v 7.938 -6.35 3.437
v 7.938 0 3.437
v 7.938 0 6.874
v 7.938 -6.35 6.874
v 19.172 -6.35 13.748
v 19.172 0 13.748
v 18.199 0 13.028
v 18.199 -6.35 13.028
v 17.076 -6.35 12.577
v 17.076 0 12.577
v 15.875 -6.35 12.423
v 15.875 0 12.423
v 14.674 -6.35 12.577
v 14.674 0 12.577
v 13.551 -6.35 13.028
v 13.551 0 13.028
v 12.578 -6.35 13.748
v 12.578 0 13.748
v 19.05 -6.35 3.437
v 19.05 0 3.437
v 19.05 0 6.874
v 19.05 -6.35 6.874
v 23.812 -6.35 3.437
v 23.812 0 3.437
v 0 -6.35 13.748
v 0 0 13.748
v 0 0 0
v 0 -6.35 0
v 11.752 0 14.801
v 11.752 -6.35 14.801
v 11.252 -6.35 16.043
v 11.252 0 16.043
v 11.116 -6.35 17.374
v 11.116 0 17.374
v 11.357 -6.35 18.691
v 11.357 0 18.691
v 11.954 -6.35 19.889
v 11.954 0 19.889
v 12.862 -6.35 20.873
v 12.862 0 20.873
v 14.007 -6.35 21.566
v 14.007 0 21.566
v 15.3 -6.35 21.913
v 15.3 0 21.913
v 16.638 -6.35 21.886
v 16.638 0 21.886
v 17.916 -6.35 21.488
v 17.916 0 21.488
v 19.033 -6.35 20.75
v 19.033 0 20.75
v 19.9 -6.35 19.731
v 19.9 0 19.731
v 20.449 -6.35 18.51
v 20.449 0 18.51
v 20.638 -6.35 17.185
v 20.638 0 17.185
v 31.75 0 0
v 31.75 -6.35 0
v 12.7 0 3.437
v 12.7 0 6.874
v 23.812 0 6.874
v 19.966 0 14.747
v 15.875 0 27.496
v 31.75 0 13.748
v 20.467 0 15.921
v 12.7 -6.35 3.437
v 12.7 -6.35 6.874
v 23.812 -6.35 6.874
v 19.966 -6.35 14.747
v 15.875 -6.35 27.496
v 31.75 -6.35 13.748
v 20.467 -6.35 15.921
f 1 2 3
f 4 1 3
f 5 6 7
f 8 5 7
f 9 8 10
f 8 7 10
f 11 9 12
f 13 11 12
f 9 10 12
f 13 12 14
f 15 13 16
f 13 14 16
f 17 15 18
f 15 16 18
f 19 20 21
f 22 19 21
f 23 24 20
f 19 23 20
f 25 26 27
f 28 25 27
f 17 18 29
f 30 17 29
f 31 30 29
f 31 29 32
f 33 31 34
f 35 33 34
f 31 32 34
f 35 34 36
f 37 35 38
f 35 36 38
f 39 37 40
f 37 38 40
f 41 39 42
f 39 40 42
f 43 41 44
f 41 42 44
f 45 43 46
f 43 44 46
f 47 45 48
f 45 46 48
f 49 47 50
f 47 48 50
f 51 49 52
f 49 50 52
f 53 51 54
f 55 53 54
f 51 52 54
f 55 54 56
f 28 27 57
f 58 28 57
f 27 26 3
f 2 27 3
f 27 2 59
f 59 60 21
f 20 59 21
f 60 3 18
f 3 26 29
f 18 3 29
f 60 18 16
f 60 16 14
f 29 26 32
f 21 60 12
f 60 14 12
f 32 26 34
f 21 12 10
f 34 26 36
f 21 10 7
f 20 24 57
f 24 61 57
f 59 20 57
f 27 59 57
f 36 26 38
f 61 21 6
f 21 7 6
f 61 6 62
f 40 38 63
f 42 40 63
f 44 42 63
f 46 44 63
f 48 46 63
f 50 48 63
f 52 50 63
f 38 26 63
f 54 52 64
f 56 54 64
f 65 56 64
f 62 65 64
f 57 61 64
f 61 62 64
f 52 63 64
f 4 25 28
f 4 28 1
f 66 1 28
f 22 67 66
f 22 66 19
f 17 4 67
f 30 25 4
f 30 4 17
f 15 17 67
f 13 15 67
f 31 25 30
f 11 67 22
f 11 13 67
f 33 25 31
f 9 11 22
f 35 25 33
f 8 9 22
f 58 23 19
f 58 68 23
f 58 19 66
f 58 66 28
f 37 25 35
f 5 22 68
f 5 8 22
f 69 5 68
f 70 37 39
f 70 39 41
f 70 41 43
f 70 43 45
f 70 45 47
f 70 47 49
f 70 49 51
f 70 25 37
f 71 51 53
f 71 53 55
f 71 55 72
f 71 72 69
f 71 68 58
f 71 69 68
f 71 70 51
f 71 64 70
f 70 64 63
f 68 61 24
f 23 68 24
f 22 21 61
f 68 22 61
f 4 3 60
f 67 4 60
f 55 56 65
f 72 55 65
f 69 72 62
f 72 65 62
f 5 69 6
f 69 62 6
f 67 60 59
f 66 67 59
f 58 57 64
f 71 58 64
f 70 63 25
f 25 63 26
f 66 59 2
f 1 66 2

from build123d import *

# Parameters (mm, degrees)
F1_DEPTH = 6.35


# Not quite as in the source:
# - a feature names something its author has since deleted; it is built from what else it names


with BuildPart() as f1:
    # F0 (on Front) → F1 (new body)
    with BuildSketch(Plane.XZ):
        Polygon((1.984375, 3.4370383213), (0, 0), (7.9375, 0), (15.875, 0), (31.75, 0), (29.765625, 3.4370383213), (23.8125, 3.4370383213), (19.05, 3.4370383213), (15.875, 3.4370383213), (12.7, 3.4370383213), (11.90625, 3.4370383213), (7.9375, 3.4370383213), align=None)
        Polygon((0, 3.4370383213), (0, 0), (1.984375, 3.4370383213), align=None)
        Polygon((0, 3.4370383213), (1.984375, 3.4370383213), (7.9375, 13.7481532851), (0, 13.7481532851), (0, 6.8740766425), align=None)
        with BuildLine():
            Line((7.9375, 13.7481532851), (1.984375, 3.4370383213))
            Line((1.984375, 3.4370383213), (7.9375, 3.4370383213))
            Line((7.9375, 3.4370383213), (7.9375, 6.8740766425))
            Line((7.9375, 6.8740766425), (12.7, 6.8740766425))
            Line((12.7, 6.8740766425), (15.875, 6.8740766425))
            Line((15.875, 6.8740766425), (19.05, 6.8740766425))
            Line((19.05, 6.8740766425), (23.8125, 6.8740766425))
            Line((23.8125, 6.8740766425), (23.8125, 3.4370383213))
            Line((23.8125, 3.4370383213), (29.765625, 3.4370383213))
            Line((29.765625, 3.4370383213), (23.8125, 13.7481532851))
            Line((23.8125, 13.7481532851), (19.1716913456, 13.7481532851))
            ThreePointArc((19.1716913456, 13.7481532851), (15.875, 12.4226916063), (12.5783086544, 13.7481532851))
            Line((12.5783086544, 13.7481532851), (7.9375, 13.7481532851))
        make_face()
        Polygon((0, 13.7481532851), (7.9375, 13.7481532851), (15.875, 27.4963065702), align=None)
        with BuildLine():
            Line((15.875, 27.4963065702), (7.9375, 13.7481532851))
            Line((7.9375, 13.7481532851), (12.5783086544, 13.7481532851))
            ThreePointArc((12.5783086544, 13.7481532851), (14.0067235595, 21.56593919), (20.6375, 17.1851916063))
            ThreePointArc((20.6375, 17.1851916063), (20.2557475837, 15.3169151658), (19.1716913456, 13.7481532851))
            Line((19.1716913456, 13.7481532851), (23.8125, 13.7481532851))
            Line((23.8125, 13.7481532851), (15.875, 27.4963065702))
        make_face()
        Polygon((29.765625, 3.4370383213), (31.75, 0), (31.75, 3.4370383213), align=None)
        Polygon((31.75, 13.7481532851), (15.875, 27.4963065702), (23.8125, 13.7481532851), align=None)
        Polygon((23.8125, 13.7481532851), (29.765625, 3.4370383213), (31.75, 3.4370383213), (31.75, 13.7481532851), align=None)
        Polygon((12.7, 6.8740766425), (12.7, 3.4370383213), (15.875, 3.4370383213), (19.05, 3.4370383213), (19.05, 6.8740766425), (15.875, 6.8740766425), align=None)
    extrude(amount=F1_DEPTH)


solid = f1.part
